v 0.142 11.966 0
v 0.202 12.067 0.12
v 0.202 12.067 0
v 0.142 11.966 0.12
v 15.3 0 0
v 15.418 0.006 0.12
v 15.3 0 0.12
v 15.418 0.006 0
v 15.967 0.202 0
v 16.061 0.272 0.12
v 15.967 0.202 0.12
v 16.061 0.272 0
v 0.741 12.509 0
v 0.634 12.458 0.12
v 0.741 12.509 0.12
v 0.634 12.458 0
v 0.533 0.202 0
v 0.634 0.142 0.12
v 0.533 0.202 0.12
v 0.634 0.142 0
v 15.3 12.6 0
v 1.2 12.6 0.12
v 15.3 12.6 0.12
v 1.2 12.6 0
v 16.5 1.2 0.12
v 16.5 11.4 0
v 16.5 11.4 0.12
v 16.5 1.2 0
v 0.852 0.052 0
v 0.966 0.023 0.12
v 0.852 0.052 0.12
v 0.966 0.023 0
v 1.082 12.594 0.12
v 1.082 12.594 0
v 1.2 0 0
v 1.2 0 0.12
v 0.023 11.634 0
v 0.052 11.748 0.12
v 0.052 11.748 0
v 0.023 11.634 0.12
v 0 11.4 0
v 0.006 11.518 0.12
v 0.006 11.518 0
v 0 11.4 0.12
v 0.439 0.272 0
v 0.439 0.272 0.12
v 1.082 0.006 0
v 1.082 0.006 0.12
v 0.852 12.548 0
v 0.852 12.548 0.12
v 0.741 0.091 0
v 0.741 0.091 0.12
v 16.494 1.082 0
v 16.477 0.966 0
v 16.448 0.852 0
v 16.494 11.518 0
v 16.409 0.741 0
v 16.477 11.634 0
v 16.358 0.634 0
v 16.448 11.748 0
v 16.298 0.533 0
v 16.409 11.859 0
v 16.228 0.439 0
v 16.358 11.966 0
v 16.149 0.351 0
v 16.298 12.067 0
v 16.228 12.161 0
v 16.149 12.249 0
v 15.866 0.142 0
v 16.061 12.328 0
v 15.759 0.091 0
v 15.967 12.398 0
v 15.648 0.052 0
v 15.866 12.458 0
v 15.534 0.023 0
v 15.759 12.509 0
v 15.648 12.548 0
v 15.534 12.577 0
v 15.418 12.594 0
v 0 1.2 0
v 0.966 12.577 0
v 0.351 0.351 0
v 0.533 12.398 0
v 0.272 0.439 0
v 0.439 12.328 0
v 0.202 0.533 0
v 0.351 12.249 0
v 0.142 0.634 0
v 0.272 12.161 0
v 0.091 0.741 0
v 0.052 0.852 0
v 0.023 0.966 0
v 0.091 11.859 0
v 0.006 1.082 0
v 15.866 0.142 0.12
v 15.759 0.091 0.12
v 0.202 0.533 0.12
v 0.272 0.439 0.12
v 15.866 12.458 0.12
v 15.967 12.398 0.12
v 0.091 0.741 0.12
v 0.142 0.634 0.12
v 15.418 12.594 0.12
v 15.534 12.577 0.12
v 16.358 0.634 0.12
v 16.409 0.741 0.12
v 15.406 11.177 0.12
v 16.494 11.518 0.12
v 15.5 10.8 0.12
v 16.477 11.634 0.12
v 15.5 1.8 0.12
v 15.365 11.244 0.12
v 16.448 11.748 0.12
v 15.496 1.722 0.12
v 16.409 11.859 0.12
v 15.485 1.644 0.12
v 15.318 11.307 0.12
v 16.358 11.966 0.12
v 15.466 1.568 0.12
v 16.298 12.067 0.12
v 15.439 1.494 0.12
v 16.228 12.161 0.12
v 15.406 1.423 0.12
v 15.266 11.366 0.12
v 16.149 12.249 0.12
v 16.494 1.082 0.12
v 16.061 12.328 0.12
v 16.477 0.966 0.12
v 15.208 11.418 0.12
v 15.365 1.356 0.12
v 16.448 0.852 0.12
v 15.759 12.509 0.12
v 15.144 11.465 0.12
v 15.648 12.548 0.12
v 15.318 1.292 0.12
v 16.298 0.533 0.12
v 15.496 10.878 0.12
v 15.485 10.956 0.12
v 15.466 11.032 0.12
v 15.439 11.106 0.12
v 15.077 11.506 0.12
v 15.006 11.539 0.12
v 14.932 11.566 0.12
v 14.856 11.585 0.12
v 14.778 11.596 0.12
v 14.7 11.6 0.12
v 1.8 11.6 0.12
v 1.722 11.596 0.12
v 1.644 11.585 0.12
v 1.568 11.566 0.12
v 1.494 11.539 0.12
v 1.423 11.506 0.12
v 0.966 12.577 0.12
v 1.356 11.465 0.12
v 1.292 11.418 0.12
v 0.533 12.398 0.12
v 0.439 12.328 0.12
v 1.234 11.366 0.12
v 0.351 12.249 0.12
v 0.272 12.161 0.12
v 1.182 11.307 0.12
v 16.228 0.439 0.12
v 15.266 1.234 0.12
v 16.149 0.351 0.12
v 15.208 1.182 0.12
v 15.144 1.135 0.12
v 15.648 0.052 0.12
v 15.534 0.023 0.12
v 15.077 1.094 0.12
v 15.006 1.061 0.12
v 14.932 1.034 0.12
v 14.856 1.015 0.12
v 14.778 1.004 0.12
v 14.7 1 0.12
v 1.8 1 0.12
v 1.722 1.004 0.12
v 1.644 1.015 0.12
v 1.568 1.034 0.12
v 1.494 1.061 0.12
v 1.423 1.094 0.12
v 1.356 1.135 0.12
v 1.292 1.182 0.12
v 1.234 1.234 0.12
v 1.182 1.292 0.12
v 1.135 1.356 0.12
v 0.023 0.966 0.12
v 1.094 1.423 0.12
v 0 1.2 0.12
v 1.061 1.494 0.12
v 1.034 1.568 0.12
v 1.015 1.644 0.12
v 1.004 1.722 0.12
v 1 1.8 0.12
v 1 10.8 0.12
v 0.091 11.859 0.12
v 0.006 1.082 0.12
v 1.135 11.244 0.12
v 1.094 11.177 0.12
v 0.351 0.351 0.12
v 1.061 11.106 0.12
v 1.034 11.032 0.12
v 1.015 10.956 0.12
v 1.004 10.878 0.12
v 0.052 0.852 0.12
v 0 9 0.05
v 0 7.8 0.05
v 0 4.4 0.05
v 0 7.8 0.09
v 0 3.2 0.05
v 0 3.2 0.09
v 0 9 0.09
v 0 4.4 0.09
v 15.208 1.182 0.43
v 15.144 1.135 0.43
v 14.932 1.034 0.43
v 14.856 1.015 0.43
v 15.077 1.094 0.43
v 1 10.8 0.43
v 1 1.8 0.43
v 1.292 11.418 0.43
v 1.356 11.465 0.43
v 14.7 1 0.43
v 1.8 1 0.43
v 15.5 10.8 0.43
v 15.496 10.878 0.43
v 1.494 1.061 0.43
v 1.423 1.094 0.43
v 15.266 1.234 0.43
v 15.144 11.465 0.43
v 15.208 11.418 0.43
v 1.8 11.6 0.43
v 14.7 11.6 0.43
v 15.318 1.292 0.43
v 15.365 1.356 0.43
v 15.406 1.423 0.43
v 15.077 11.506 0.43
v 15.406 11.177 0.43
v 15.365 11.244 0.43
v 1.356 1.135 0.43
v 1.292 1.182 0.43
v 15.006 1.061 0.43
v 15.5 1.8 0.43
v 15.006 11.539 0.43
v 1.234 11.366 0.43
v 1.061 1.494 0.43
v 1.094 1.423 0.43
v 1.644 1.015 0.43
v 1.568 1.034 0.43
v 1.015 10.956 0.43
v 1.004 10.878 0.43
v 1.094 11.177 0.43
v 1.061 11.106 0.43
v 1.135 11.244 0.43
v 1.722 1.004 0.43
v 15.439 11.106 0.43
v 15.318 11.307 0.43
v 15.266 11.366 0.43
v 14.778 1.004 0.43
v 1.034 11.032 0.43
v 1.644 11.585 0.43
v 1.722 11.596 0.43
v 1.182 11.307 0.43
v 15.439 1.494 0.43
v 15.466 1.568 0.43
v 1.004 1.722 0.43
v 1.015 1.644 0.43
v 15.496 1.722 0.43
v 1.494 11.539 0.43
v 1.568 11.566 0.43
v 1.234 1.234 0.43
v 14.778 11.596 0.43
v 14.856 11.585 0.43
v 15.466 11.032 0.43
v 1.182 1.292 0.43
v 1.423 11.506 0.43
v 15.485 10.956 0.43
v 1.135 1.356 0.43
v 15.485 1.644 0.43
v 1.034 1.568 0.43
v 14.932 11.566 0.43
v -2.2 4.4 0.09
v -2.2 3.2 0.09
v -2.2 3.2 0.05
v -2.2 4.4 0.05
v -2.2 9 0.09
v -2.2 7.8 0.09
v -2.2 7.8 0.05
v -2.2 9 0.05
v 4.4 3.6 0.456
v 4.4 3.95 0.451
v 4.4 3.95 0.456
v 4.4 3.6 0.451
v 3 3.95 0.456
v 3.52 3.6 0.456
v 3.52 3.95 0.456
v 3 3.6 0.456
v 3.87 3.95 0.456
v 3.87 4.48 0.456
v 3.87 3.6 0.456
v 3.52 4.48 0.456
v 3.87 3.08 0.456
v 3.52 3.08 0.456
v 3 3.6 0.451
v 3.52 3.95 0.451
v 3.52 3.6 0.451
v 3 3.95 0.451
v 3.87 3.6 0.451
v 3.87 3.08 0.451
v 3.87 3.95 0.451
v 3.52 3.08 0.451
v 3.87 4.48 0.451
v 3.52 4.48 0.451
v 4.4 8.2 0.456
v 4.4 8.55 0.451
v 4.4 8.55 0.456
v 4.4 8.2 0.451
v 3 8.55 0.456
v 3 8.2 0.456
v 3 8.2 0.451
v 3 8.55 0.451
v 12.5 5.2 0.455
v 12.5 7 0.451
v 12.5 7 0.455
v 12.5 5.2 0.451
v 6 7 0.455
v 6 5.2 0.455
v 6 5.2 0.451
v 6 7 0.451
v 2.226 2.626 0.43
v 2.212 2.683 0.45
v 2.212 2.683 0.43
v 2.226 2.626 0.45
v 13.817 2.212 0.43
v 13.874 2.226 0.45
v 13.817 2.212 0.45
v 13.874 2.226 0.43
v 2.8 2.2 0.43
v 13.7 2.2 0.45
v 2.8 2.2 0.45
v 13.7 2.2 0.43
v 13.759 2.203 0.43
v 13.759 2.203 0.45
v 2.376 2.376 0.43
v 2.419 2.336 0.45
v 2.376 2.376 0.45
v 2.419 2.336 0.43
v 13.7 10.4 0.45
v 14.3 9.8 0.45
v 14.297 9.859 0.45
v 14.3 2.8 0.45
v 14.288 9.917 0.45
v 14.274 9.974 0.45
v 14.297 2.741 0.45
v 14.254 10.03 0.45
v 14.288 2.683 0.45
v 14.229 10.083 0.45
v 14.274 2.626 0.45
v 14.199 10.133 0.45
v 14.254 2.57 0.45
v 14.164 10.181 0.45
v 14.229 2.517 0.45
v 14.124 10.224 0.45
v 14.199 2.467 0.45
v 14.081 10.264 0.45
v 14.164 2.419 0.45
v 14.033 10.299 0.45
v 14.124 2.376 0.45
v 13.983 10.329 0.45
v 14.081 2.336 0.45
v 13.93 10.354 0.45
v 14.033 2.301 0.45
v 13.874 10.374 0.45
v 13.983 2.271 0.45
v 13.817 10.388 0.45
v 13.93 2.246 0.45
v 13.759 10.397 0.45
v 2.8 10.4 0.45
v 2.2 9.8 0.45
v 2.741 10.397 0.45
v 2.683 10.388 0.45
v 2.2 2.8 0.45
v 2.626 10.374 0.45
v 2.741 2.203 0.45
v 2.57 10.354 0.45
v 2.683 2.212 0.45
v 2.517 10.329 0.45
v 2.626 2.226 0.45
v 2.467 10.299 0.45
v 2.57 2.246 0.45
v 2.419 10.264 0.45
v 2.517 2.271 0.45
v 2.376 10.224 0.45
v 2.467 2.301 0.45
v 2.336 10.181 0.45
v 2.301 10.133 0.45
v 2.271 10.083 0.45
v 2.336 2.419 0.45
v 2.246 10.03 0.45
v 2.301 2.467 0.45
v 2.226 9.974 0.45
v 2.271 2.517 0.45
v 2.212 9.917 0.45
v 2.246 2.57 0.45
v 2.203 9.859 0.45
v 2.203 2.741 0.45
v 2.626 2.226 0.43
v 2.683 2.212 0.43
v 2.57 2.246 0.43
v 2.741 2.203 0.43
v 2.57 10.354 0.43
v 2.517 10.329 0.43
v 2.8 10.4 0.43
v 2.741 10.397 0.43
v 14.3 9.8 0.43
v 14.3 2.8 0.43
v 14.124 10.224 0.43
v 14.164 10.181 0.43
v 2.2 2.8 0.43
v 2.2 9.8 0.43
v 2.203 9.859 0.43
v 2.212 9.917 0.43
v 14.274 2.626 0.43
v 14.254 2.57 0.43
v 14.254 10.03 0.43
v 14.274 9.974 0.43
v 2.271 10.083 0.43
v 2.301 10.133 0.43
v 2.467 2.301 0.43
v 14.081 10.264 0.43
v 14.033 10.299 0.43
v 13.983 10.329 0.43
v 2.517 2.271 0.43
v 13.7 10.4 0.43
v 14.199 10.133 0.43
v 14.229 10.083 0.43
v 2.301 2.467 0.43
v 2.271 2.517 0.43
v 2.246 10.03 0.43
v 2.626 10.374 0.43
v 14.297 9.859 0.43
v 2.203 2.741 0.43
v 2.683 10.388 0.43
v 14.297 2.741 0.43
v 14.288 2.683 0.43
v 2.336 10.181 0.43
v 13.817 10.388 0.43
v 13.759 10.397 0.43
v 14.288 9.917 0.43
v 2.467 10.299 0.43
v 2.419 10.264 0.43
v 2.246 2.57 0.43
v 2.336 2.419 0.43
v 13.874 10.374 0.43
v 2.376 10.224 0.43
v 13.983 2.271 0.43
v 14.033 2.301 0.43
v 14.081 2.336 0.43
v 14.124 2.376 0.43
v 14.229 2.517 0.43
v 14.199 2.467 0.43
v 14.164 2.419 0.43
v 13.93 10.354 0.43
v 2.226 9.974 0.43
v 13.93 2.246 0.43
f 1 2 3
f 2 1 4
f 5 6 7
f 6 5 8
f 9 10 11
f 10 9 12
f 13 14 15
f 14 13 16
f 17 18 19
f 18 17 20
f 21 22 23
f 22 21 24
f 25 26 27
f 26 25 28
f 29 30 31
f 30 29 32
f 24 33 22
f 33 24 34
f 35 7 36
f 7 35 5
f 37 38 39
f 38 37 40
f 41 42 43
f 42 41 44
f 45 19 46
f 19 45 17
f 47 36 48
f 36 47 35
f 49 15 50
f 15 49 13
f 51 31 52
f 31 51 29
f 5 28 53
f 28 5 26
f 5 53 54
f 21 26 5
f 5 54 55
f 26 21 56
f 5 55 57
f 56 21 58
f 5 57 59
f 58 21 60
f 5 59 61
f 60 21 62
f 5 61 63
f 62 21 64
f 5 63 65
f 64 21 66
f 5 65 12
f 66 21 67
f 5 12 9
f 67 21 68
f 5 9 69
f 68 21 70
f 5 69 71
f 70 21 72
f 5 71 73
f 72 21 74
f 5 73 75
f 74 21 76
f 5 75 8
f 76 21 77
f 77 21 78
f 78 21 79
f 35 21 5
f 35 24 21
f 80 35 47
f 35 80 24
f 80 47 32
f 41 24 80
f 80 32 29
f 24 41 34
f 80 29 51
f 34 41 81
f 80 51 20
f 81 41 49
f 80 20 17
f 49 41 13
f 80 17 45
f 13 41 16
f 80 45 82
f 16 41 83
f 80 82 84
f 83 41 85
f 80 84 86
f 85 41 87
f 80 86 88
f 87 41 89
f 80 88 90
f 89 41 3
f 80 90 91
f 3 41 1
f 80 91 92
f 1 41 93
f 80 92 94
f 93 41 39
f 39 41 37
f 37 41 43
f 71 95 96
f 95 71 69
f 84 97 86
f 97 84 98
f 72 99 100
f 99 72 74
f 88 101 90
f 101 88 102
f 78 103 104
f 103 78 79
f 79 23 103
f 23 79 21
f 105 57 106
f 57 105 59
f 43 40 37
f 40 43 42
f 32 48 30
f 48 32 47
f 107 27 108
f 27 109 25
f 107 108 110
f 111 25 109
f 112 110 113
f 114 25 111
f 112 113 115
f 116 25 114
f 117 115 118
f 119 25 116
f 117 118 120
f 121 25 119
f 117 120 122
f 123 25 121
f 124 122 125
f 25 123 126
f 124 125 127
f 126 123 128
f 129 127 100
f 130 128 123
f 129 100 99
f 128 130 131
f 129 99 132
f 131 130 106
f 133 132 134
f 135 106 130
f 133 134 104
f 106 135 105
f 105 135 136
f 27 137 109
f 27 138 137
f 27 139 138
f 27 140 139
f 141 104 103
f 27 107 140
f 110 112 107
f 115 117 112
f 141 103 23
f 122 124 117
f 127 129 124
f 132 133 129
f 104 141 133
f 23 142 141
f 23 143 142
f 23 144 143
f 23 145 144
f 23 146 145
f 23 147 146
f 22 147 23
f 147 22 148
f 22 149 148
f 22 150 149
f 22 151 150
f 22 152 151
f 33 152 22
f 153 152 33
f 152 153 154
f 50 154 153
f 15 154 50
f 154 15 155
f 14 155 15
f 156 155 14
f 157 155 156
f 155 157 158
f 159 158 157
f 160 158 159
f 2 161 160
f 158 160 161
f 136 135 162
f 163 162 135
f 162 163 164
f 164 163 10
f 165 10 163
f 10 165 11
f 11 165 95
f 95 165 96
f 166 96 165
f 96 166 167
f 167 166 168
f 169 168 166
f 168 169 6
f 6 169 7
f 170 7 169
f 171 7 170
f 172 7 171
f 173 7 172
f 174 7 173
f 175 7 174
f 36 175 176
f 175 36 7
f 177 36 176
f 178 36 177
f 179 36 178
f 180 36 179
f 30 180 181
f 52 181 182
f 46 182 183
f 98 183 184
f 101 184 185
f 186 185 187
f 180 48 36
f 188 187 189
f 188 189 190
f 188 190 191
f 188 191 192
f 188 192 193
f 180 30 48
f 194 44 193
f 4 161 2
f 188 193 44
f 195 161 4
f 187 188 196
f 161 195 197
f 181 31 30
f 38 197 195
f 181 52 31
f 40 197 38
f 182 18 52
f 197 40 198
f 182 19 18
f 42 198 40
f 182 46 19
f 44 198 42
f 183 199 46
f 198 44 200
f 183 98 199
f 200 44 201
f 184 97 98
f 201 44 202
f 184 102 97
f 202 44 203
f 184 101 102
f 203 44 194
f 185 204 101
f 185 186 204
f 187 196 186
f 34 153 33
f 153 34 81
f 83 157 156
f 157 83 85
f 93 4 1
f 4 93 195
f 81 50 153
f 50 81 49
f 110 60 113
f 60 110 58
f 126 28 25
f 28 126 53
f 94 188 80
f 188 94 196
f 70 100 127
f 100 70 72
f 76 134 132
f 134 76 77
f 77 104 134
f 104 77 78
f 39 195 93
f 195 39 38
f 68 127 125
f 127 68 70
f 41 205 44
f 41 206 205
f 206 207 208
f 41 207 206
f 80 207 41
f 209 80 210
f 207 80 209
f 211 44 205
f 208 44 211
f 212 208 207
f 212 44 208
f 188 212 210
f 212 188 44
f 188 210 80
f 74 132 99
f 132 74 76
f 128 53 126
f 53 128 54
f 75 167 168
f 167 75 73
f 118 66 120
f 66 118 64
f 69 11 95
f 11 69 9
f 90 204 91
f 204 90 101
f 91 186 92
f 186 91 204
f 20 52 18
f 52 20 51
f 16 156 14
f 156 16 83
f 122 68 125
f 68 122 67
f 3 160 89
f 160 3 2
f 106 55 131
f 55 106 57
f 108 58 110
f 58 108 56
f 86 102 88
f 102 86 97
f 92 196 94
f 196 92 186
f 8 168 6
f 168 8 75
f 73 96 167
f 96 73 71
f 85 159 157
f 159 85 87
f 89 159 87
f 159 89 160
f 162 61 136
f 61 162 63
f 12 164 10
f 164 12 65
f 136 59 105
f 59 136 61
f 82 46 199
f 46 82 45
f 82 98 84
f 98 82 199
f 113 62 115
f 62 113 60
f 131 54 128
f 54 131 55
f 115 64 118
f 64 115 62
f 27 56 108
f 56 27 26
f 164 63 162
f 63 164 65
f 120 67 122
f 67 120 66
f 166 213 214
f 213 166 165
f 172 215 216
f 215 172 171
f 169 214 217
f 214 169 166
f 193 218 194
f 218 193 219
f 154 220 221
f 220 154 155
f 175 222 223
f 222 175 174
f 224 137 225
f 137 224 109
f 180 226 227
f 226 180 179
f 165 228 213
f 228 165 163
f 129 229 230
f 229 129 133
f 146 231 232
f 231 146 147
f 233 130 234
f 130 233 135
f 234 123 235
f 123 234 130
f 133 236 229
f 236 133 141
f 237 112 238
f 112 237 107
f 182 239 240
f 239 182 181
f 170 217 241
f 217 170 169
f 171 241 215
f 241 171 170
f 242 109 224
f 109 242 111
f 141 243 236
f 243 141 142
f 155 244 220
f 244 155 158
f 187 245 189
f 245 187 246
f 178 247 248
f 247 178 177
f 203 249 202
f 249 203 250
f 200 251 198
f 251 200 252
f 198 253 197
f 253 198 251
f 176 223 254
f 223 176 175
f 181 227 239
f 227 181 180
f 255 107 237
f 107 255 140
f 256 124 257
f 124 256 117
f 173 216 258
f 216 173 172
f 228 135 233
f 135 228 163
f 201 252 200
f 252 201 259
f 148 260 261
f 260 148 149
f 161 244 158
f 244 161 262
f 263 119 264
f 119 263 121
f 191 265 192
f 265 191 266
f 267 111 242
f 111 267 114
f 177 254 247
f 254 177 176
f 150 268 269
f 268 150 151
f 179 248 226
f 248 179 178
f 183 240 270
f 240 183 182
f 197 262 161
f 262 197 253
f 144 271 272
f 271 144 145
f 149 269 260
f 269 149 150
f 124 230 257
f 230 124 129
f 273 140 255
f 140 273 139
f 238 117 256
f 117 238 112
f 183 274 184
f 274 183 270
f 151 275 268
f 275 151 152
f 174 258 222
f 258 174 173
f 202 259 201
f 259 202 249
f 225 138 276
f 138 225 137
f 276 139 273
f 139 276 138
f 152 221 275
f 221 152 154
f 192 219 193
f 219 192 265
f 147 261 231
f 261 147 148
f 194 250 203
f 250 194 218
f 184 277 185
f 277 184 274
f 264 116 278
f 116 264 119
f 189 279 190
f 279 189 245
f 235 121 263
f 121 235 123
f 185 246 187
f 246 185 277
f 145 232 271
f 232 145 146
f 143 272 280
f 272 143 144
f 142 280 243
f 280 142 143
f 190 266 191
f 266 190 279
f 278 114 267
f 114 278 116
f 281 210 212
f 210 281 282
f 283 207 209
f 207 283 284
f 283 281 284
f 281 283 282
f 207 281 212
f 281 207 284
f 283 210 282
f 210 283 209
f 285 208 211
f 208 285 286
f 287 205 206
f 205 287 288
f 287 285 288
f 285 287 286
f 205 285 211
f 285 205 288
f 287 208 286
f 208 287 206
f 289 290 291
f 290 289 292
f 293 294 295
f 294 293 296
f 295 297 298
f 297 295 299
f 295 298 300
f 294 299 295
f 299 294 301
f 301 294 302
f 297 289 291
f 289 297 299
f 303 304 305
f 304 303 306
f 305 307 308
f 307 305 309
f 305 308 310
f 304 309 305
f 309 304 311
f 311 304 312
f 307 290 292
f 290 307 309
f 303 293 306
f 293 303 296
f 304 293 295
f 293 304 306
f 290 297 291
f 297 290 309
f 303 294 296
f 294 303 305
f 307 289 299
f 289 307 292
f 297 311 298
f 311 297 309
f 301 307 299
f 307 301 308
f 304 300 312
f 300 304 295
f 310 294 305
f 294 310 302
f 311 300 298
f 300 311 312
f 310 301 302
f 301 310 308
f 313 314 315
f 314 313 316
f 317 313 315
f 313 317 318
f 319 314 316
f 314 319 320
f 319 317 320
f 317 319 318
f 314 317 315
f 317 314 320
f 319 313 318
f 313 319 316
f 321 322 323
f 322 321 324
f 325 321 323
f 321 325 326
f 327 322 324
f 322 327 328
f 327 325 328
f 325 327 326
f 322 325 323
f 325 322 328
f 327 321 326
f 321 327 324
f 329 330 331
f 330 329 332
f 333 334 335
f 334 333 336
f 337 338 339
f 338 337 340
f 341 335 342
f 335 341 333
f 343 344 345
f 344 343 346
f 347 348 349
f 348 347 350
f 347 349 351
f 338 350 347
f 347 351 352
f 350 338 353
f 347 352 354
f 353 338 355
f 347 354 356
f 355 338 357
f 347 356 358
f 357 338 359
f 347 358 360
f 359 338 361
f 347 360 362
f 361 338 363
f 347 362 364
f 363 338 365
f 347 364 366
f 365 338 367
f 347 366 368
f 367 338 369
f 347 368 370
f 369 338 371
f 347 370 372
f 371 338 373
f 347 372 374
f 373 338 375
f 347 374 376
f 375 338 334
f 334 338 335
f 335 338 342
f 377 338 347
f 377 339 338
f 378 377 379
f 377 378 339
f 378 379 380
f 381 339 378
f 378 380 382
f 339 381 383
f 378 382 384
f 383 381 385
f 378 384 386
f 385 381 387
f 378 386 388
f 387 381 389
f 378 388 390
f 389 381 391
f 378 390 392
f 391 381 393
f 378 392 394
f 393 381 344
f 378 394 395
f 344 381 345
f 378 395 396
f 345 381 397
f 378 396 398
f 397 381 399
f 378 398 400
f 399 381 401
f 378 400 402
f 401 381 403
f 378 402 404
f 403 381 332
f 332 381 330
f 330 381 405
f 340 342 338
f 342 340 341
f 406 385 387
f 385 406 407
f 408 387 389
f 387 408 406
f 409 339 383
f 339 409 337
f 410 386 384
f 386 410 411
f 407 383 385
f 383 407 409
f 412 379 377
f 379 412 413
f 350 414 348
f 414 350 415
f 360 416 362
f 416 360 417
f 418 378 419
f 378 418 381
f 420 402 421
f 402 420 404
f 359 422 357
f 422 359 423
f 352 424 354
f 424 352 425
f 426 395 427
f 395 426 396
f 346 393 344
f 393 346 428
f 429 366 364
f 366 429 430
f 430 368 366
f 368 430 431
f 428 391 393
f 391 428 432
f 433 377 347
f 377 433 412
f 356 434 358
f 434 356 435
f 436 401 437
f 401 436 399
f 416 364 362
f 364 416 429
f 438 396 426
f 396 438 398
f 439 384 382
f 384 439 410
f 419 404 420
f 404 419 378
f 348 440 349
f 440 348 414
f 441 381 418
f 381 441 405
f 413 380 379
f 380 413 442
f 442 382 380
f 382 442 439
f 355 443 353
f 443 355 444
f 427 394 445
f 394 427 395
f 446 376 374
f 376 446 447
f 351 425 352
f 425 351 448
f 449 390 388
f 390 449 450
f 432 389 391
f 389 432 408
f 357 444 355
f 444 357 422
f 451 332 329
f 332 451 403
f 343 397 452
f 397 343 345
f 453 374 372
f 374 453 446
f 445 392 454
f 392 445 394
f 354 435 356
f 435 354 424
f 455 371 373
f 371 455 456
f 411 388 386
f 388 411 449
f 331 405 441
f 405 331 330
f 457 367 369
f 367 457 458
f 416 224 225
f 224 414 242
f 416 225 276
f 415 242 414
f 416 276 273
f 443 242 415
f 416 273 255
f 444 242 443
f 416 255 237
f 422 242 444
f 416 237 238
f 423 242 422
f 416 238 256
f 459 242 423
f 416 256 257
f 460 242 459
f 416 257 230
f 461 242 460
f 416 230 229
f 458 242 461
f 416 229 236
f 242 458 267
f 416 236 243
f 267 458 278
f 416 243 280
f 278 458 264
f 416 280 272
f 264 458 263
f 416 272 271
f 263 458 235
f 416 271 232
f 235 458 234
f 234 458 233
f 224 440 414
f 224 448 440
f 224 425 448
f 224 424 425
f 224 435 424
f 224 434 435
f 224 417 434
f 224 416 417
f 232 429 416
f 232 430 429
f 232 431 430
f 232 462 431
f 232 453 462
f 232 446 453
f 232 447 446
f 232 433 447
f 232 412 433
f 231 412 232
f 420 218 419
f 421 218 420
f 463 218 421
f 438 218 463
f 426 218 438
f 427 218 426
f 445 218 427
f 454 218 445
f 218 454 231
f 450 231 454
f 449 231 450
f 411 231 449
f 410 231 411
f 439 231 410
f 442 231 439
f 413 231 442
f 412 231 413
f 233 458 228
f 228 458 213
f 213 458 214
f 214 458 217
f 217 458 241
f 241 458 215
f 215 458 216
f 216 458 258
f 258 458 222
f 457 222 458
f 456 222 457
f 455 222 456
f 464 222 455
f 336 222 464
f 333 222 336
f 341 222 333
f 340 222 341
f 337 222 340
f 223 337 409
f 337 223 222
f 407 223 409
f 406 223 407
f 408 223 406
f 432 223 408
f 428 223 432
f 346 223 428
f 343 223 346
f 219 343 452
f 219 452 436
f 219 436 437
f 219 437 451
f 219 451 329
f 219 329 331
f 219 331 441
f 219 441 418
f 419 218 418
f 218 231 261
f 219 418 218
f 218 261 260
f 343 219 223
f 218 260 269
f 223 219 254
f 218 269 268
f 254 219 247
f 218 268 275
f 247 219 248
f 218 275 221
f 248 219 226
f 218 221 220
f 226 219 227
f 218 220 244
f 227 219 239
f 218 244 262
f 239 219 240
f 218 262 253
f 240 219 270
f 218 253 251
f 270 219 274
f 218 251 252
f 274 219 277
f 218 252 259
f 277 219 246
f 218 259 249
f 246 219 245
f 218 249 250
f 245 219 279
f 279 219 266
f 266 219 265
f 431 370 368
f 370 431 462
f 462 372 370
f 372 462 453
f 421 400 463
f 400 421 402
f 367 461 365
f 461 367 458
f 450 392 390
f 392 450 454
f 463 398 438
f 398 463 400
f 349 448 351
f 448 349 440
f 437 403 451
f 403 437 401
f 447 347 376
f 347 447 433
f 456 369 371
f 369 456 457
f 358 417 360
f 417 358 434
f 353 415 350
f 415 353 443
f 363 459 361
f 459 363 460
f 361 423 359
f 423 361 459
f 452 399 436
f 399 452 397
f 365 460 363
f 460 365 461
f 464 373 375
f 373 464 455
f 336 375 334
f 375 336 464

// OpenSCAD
// file: ../Common/params.scad
// =========================================================================
// PencilAI - Common Parameters, Colors & Utility Library
// File: CAD Modelling/Common/params.scad
// =========================================================================

// --- Resolution Settings ---
$fn = 64;

// --- Physical Strip Dimensions (mm) ---
STRIP_LEN        = 54.0;   // Length of flexible tape (wraps ~1.9x on 9mm barrel)
STRIP_WID        = 20.0;   // Width of tape along the pen axis (grip zone height)
STRIP_CORNER_R   = 2.0;    // Rounded corner radius to prevent peeling

// --- Layer Heights & Z-Stackup (mm) ---
THICK_ADHESIVE   = 0.055;  // Skin-safe medical acrylic adhesive
THICK_KAPTON     = 0.025;  // Flexible Polyimide film substrate (25 um)
THICK_BASE       = THICK_ADHESIVE + THICK_KAPTON; // 0.080 mm base

THICK_COPPER     = 0.020;  // Etched copper traces (1/2 oz / 18-20 um)
THICK_GOLD       = 0.005;  // ENIG surface finish plating
THICK_CARBON     = 0.030;  // Screen-printed carbon resistive ink (30 um)
THICK_SPACER     = 0.015;  // Dielectric spacer dot height

THICK_TPU_SKIN   = 0.450;  // Translucent matte TPU outer protective grip film
THICK_TOTAL_MAX  = 0.530;  // Target total profile thickness: 0.53 mm

// --- Component Dimensions (mm) ---
// ST LIS2DH12 Ultra-low-power 3-axis accelerometer (WLCSP-12)
ACCEL_LEN        = 1.60;
ACCEL_WID        = 1.60;
ACCEL_H          = 0.40;   // Ultra-thin WLCSP package
ACCEL_BALL_PITCH = 0.40;   // 3x4 solder ball matrix
ACCEL_BALL_DIA   = 0.22;

// BLE Beacon SoC (InPlay IN100 / Nordic nRF52810 WLCSP)
BLE_LEN          = 2.20;
BLE_WID          = 2.20;
BLE_H            = 0.35;   // 0.35 mm profile
BLE_BALL_PITCH   = 0.45;   // 4x4 solder ball matrix
BLE_BALL_DIA     = 0.24;

// Ultra-Thin Printed Zinc-Manganese (Zn-Mn) Flexible Battery
BAT_LEN          = 16.5;   // Main pouch length
BAT_WID          = 12.6;   // Main pouch width
BAT_H            = 0.45;   // Printed paper battery thickness (0.45 mm)
BAT_SEAL_MARGIN  = 1.0;    // Perimeter foil crimp seal width
BAT_TAB_LEN      = 2.4;    // Terminal connector tab length
BAT_TAB_WID      = 1.2;    // Terminal tab width

// Interdigitated Carbon FSR Pinch Zone
FSR_LEN          = 17.5;
FSR_WID          = 13.6;
FSR_FINGERS      = 16;
FSR_BUS_WID      = 0.60;

// Serpentine 2.4 GHz Antenna
ANT_LOOPS        = 6;
ANT_STEP         = 1.40;
ANT_AMP          = 2.40;
ANT_TRACE_WID    = 0.35;

// Reference Pen
PEN_DIAMETER_DEFAULT = 9.0; // Standard ballpoint barrel (mm)

// --- Color Palette (RGBA) ---
C_KAPTON         = [0.85, 0.48, 0.08, 0.88]; // Translucent Amber Polyimide
C_ADHESIVE       = [0.95, 0.95, 0.92, 0.50]; // Clear skin-safe acrylic adhesive
C_RELEASE_LINER  = [0.98, 0.98, 0.96, 0.95]; // White silicone-coated pull tab
C_TPU_SKIN       = [0.18, 0.19, 0.22, 0.55]; // Translucent Charcoal Matte TPU
C_TPU_OPAQUE     = [0.14, 0.15, 0.17, 1.00]; // Grip ridges / tactile accents
C_COPPER         = [0.85, 0.45, 0.22, 1.00]; // Raw Etched Copper
C_GOLD           = [0.92, 0.74, 0.20, 1.00]; // ENIG Gold Plating
C_CARBON         = [0.12, 0.12, 0.13, 0.98]; // Screen-Printed Carbon Ink
C_DIELECTRIC     = [0.20, 0.65, 0.40, 0.75]; // Green/Teal Dielectric Spacer
C_SILICON        = [0.09, 0.10, 0.12, 1.00]; // WLCSP Mirror Silicon Die
C_SOLDER         = [0.76, 0.78, 0.82, 1.00]; // SAC305 Lead-Free Solder
C_CERAMIC        = [0.70, 0.58, 0.46, 1.00]; // 0201 MLCC Brown Ceramic
C_BATTERY_FOIL   = [0.80, 0.82, 0.85, 1.00]; // Hermetic Aluminum/Poly Pouch
C_BATTERY_SEAL   = [0.65, 0.67, 0.70, 1.00]; // Crimped Pouch Flange
C_BAT_ACCENT     = [0.15, 0.45, 0.75, 1.00]; // Insulator Layer / Branding
C_PEN_BARREL     = [0.93, 0.94, 0.96, 0.90]; // Smooth Polycarbonate Barrel
C_PEN_CHROME     = [0.84, 0.86, 0.89, 1.00]; // Mirror Chrome Trim
C_PEN_BRASS      = [0.86, 0.70, 0.28, 1.00]; // Machined Brass Tip Collar
C_PEN_BALL       = [0.35, 0.36, 0.38, 1.00]; // Tungsten Carbide Ball
C_PEN_INK        = [0.05, 0.10, 0.35, 1.00]; // Blue Ink Column inside refill

// --- Reusable Geometric Modules ---

// 2D Rounded Rectangle (Centered or Corner Origin)
module rounded_rect_2d(length, width, radius, center = false) {
    tx = center ? -length / 2 : 0;
    ty = center ? -width / 2 : 0;
    translate([tx, ty])
        offset(r = radius)
            offset(delta = -radius)
                square([length, width]);
}

// 3D Rounded Extruded Plate
module rounded_box(length, width, height, radius, center = false) {
    linear_extrude(height = height)
        rounded_rect_2d(length, width, radius, center = center);
}

// Spherical Solder Ball
module solder_ball(diameter) {
    color(C_SOLDER)
        sphere(d = diameter, $fn = 32);
}

// SMD 0201 / 01005 Passive Component (Capacitor / Inductor / Resistor)
module smd_passive_0201(len = 0.60, wid = 0.30, height = 0.30, body_color = C_CERAMIC) {
    term_len = 0.15;
    // Central Ceramic/Ferrite Body
    color(body_color)
        translate([term_len, 0, 0])
            cube([len - 2 * term_len, wid, height]);
    // Silver End Terminations
    color(C_SOLDER) {
        cube([term_len, wid, height]);
        translate([len - term_len, 0, 0])
            cube([term_len, wid, height]);
    }
}

// Circular Fiducial Alignment Marker (for high-precision flex assembly)
module fiducial_marker(diameter = 1.0, copper_h = THICK_COPPER) {
    color(C_GOLD)
        cylinder(d = diameter, h = copper_h, $fn = 32);
    color(C_KAPTON)
        difference() {
            cylinder(d = diameter * 2.2, h = copper_h + 0.001, $fn = 32);
            cylinder(d = diameter * 1.4, h = copper_h + 0.002, $fn = 32);
        }
}
// main file
// =========================================================================
// PencilAI - Ultra-Thin Printed Zinc-Manganese (Zn-Mn) Flexible Battery
// File: CAD Modelling/Battery/zinc_mn_printed_battery.scad
// =========================================================================

include <../Common/params.scad>

// --- View Controls (when rendered directly) ---
show_pouch_seal   = true;   // Crimped hermetic perimeter flange
show_terminals    = true;   // Nickel / conductive carbon collector tabs
show_label        = true;   // Blue dielectric insulator film & polarity marks

module printed_battery(
    x = 0,
    y = 0,
    z = THICK_BASE,
    length = BAT_LEN,
    width = BAT_WID,
    height = BAT_H
) {
    translate([x, y, z]) {
        // 1. Crimped Perimeter Pouch Seal Flange (0.12 mm thick border)
        if (show_pouch_seal) {
            color(C_BATTERY_SEAL) {
                difference() {
                    rounded_box(length, width, 0.12, 1.2);
                    translate([BAT_SEAL_MARGIN, BAT_SEAL_MARGIN, -0.01])
                        rounded_box(length - 2 * BAT_SEAL_MARGIN, width - 2 * BAT_SEAL_MARGIN, 0.14, 0.8);
                }
            }
        }

        // 2. Main Electrolyte & Active Electrode Foil Pouch Body
        color(C_BATTERY_FOIL) {
            translate([BAT_SEAL_MARGIN, BAT_SEAL_MARGIN, 0])
                rounded_box(length - 2 * BAT_SEAL_MARGIN, width - 2 * BAT_SEAL_MARGIN, height - 0.02, 0.8);
        }

        // 3. Positive & Negative Terminal Collector Tabs
        if (show_terminals) {
            // Anode (+) Tab (Gold-plated / nickel contact)
            color(C_GOLD)
                translate([-BAT_TAB_LEN + 0.2, 3.2, 0.05])
                    cube([BAT_TAB_LEN, BAT_TAB_WID, 0.04]);

            // Cathode (-) Tab
            color(C_SOLDER)
                translate([-BAT_TAB_LEN + 0.2, 7.8, 0.05])
                    cube([BAT_TAB_LEN, BAT_TAB_WID, 0.04]);
        }

        // 4. Blue Dielectric Insulator Accent & Laser Polarity Markings
        if (show_label) {
            // Insulator cover film
            color(C_BAT_ACCENT)
                translate([BAT_SEAL_MARGIN + 1.2, BAT_SEAL_MARGIN + 1.2, height - 0.02])
                    rounded_box(length - 2 * BAT_SEAL_MARGIN - 2.4, width - 2 * BAT_SEAL_MARGIN - 2.4, 0.02, 0.6);

            // Polarity Marks (+ and -) printed in crisp white/silver
            color([0.95, 0.95, 0.98, 1.0]) {
                // "+" Mark near Anode Tab
                translate([BAT_SEAL_MARGIN + 2.0, 3.6, height + 0.001]) {
                    cube([1.4, 0.35, 0.005]);
                    translate([0.52, -0.52, 0]) cube([0.35, 1.4, 0.005]);
                }

                // "-" Mark near Cathode Tab
                translate([BAT_SEAL_MARGIN + 2.0, 8.2, height + 0.001])
                    cube([1.4, 0.35, 0.005]);

                // "PencilAI Zn-Mn 1.5V" silk branding stripe
                translate([BAT_SEAL_MARGIN + 5.0, 5.2, height + 0.001])
                    cube([6.5, 1.8, 0.004]);
            }
        }
    }
}

// Standalone Render
printed_battery(x = 0, y = 0, z = 0);
